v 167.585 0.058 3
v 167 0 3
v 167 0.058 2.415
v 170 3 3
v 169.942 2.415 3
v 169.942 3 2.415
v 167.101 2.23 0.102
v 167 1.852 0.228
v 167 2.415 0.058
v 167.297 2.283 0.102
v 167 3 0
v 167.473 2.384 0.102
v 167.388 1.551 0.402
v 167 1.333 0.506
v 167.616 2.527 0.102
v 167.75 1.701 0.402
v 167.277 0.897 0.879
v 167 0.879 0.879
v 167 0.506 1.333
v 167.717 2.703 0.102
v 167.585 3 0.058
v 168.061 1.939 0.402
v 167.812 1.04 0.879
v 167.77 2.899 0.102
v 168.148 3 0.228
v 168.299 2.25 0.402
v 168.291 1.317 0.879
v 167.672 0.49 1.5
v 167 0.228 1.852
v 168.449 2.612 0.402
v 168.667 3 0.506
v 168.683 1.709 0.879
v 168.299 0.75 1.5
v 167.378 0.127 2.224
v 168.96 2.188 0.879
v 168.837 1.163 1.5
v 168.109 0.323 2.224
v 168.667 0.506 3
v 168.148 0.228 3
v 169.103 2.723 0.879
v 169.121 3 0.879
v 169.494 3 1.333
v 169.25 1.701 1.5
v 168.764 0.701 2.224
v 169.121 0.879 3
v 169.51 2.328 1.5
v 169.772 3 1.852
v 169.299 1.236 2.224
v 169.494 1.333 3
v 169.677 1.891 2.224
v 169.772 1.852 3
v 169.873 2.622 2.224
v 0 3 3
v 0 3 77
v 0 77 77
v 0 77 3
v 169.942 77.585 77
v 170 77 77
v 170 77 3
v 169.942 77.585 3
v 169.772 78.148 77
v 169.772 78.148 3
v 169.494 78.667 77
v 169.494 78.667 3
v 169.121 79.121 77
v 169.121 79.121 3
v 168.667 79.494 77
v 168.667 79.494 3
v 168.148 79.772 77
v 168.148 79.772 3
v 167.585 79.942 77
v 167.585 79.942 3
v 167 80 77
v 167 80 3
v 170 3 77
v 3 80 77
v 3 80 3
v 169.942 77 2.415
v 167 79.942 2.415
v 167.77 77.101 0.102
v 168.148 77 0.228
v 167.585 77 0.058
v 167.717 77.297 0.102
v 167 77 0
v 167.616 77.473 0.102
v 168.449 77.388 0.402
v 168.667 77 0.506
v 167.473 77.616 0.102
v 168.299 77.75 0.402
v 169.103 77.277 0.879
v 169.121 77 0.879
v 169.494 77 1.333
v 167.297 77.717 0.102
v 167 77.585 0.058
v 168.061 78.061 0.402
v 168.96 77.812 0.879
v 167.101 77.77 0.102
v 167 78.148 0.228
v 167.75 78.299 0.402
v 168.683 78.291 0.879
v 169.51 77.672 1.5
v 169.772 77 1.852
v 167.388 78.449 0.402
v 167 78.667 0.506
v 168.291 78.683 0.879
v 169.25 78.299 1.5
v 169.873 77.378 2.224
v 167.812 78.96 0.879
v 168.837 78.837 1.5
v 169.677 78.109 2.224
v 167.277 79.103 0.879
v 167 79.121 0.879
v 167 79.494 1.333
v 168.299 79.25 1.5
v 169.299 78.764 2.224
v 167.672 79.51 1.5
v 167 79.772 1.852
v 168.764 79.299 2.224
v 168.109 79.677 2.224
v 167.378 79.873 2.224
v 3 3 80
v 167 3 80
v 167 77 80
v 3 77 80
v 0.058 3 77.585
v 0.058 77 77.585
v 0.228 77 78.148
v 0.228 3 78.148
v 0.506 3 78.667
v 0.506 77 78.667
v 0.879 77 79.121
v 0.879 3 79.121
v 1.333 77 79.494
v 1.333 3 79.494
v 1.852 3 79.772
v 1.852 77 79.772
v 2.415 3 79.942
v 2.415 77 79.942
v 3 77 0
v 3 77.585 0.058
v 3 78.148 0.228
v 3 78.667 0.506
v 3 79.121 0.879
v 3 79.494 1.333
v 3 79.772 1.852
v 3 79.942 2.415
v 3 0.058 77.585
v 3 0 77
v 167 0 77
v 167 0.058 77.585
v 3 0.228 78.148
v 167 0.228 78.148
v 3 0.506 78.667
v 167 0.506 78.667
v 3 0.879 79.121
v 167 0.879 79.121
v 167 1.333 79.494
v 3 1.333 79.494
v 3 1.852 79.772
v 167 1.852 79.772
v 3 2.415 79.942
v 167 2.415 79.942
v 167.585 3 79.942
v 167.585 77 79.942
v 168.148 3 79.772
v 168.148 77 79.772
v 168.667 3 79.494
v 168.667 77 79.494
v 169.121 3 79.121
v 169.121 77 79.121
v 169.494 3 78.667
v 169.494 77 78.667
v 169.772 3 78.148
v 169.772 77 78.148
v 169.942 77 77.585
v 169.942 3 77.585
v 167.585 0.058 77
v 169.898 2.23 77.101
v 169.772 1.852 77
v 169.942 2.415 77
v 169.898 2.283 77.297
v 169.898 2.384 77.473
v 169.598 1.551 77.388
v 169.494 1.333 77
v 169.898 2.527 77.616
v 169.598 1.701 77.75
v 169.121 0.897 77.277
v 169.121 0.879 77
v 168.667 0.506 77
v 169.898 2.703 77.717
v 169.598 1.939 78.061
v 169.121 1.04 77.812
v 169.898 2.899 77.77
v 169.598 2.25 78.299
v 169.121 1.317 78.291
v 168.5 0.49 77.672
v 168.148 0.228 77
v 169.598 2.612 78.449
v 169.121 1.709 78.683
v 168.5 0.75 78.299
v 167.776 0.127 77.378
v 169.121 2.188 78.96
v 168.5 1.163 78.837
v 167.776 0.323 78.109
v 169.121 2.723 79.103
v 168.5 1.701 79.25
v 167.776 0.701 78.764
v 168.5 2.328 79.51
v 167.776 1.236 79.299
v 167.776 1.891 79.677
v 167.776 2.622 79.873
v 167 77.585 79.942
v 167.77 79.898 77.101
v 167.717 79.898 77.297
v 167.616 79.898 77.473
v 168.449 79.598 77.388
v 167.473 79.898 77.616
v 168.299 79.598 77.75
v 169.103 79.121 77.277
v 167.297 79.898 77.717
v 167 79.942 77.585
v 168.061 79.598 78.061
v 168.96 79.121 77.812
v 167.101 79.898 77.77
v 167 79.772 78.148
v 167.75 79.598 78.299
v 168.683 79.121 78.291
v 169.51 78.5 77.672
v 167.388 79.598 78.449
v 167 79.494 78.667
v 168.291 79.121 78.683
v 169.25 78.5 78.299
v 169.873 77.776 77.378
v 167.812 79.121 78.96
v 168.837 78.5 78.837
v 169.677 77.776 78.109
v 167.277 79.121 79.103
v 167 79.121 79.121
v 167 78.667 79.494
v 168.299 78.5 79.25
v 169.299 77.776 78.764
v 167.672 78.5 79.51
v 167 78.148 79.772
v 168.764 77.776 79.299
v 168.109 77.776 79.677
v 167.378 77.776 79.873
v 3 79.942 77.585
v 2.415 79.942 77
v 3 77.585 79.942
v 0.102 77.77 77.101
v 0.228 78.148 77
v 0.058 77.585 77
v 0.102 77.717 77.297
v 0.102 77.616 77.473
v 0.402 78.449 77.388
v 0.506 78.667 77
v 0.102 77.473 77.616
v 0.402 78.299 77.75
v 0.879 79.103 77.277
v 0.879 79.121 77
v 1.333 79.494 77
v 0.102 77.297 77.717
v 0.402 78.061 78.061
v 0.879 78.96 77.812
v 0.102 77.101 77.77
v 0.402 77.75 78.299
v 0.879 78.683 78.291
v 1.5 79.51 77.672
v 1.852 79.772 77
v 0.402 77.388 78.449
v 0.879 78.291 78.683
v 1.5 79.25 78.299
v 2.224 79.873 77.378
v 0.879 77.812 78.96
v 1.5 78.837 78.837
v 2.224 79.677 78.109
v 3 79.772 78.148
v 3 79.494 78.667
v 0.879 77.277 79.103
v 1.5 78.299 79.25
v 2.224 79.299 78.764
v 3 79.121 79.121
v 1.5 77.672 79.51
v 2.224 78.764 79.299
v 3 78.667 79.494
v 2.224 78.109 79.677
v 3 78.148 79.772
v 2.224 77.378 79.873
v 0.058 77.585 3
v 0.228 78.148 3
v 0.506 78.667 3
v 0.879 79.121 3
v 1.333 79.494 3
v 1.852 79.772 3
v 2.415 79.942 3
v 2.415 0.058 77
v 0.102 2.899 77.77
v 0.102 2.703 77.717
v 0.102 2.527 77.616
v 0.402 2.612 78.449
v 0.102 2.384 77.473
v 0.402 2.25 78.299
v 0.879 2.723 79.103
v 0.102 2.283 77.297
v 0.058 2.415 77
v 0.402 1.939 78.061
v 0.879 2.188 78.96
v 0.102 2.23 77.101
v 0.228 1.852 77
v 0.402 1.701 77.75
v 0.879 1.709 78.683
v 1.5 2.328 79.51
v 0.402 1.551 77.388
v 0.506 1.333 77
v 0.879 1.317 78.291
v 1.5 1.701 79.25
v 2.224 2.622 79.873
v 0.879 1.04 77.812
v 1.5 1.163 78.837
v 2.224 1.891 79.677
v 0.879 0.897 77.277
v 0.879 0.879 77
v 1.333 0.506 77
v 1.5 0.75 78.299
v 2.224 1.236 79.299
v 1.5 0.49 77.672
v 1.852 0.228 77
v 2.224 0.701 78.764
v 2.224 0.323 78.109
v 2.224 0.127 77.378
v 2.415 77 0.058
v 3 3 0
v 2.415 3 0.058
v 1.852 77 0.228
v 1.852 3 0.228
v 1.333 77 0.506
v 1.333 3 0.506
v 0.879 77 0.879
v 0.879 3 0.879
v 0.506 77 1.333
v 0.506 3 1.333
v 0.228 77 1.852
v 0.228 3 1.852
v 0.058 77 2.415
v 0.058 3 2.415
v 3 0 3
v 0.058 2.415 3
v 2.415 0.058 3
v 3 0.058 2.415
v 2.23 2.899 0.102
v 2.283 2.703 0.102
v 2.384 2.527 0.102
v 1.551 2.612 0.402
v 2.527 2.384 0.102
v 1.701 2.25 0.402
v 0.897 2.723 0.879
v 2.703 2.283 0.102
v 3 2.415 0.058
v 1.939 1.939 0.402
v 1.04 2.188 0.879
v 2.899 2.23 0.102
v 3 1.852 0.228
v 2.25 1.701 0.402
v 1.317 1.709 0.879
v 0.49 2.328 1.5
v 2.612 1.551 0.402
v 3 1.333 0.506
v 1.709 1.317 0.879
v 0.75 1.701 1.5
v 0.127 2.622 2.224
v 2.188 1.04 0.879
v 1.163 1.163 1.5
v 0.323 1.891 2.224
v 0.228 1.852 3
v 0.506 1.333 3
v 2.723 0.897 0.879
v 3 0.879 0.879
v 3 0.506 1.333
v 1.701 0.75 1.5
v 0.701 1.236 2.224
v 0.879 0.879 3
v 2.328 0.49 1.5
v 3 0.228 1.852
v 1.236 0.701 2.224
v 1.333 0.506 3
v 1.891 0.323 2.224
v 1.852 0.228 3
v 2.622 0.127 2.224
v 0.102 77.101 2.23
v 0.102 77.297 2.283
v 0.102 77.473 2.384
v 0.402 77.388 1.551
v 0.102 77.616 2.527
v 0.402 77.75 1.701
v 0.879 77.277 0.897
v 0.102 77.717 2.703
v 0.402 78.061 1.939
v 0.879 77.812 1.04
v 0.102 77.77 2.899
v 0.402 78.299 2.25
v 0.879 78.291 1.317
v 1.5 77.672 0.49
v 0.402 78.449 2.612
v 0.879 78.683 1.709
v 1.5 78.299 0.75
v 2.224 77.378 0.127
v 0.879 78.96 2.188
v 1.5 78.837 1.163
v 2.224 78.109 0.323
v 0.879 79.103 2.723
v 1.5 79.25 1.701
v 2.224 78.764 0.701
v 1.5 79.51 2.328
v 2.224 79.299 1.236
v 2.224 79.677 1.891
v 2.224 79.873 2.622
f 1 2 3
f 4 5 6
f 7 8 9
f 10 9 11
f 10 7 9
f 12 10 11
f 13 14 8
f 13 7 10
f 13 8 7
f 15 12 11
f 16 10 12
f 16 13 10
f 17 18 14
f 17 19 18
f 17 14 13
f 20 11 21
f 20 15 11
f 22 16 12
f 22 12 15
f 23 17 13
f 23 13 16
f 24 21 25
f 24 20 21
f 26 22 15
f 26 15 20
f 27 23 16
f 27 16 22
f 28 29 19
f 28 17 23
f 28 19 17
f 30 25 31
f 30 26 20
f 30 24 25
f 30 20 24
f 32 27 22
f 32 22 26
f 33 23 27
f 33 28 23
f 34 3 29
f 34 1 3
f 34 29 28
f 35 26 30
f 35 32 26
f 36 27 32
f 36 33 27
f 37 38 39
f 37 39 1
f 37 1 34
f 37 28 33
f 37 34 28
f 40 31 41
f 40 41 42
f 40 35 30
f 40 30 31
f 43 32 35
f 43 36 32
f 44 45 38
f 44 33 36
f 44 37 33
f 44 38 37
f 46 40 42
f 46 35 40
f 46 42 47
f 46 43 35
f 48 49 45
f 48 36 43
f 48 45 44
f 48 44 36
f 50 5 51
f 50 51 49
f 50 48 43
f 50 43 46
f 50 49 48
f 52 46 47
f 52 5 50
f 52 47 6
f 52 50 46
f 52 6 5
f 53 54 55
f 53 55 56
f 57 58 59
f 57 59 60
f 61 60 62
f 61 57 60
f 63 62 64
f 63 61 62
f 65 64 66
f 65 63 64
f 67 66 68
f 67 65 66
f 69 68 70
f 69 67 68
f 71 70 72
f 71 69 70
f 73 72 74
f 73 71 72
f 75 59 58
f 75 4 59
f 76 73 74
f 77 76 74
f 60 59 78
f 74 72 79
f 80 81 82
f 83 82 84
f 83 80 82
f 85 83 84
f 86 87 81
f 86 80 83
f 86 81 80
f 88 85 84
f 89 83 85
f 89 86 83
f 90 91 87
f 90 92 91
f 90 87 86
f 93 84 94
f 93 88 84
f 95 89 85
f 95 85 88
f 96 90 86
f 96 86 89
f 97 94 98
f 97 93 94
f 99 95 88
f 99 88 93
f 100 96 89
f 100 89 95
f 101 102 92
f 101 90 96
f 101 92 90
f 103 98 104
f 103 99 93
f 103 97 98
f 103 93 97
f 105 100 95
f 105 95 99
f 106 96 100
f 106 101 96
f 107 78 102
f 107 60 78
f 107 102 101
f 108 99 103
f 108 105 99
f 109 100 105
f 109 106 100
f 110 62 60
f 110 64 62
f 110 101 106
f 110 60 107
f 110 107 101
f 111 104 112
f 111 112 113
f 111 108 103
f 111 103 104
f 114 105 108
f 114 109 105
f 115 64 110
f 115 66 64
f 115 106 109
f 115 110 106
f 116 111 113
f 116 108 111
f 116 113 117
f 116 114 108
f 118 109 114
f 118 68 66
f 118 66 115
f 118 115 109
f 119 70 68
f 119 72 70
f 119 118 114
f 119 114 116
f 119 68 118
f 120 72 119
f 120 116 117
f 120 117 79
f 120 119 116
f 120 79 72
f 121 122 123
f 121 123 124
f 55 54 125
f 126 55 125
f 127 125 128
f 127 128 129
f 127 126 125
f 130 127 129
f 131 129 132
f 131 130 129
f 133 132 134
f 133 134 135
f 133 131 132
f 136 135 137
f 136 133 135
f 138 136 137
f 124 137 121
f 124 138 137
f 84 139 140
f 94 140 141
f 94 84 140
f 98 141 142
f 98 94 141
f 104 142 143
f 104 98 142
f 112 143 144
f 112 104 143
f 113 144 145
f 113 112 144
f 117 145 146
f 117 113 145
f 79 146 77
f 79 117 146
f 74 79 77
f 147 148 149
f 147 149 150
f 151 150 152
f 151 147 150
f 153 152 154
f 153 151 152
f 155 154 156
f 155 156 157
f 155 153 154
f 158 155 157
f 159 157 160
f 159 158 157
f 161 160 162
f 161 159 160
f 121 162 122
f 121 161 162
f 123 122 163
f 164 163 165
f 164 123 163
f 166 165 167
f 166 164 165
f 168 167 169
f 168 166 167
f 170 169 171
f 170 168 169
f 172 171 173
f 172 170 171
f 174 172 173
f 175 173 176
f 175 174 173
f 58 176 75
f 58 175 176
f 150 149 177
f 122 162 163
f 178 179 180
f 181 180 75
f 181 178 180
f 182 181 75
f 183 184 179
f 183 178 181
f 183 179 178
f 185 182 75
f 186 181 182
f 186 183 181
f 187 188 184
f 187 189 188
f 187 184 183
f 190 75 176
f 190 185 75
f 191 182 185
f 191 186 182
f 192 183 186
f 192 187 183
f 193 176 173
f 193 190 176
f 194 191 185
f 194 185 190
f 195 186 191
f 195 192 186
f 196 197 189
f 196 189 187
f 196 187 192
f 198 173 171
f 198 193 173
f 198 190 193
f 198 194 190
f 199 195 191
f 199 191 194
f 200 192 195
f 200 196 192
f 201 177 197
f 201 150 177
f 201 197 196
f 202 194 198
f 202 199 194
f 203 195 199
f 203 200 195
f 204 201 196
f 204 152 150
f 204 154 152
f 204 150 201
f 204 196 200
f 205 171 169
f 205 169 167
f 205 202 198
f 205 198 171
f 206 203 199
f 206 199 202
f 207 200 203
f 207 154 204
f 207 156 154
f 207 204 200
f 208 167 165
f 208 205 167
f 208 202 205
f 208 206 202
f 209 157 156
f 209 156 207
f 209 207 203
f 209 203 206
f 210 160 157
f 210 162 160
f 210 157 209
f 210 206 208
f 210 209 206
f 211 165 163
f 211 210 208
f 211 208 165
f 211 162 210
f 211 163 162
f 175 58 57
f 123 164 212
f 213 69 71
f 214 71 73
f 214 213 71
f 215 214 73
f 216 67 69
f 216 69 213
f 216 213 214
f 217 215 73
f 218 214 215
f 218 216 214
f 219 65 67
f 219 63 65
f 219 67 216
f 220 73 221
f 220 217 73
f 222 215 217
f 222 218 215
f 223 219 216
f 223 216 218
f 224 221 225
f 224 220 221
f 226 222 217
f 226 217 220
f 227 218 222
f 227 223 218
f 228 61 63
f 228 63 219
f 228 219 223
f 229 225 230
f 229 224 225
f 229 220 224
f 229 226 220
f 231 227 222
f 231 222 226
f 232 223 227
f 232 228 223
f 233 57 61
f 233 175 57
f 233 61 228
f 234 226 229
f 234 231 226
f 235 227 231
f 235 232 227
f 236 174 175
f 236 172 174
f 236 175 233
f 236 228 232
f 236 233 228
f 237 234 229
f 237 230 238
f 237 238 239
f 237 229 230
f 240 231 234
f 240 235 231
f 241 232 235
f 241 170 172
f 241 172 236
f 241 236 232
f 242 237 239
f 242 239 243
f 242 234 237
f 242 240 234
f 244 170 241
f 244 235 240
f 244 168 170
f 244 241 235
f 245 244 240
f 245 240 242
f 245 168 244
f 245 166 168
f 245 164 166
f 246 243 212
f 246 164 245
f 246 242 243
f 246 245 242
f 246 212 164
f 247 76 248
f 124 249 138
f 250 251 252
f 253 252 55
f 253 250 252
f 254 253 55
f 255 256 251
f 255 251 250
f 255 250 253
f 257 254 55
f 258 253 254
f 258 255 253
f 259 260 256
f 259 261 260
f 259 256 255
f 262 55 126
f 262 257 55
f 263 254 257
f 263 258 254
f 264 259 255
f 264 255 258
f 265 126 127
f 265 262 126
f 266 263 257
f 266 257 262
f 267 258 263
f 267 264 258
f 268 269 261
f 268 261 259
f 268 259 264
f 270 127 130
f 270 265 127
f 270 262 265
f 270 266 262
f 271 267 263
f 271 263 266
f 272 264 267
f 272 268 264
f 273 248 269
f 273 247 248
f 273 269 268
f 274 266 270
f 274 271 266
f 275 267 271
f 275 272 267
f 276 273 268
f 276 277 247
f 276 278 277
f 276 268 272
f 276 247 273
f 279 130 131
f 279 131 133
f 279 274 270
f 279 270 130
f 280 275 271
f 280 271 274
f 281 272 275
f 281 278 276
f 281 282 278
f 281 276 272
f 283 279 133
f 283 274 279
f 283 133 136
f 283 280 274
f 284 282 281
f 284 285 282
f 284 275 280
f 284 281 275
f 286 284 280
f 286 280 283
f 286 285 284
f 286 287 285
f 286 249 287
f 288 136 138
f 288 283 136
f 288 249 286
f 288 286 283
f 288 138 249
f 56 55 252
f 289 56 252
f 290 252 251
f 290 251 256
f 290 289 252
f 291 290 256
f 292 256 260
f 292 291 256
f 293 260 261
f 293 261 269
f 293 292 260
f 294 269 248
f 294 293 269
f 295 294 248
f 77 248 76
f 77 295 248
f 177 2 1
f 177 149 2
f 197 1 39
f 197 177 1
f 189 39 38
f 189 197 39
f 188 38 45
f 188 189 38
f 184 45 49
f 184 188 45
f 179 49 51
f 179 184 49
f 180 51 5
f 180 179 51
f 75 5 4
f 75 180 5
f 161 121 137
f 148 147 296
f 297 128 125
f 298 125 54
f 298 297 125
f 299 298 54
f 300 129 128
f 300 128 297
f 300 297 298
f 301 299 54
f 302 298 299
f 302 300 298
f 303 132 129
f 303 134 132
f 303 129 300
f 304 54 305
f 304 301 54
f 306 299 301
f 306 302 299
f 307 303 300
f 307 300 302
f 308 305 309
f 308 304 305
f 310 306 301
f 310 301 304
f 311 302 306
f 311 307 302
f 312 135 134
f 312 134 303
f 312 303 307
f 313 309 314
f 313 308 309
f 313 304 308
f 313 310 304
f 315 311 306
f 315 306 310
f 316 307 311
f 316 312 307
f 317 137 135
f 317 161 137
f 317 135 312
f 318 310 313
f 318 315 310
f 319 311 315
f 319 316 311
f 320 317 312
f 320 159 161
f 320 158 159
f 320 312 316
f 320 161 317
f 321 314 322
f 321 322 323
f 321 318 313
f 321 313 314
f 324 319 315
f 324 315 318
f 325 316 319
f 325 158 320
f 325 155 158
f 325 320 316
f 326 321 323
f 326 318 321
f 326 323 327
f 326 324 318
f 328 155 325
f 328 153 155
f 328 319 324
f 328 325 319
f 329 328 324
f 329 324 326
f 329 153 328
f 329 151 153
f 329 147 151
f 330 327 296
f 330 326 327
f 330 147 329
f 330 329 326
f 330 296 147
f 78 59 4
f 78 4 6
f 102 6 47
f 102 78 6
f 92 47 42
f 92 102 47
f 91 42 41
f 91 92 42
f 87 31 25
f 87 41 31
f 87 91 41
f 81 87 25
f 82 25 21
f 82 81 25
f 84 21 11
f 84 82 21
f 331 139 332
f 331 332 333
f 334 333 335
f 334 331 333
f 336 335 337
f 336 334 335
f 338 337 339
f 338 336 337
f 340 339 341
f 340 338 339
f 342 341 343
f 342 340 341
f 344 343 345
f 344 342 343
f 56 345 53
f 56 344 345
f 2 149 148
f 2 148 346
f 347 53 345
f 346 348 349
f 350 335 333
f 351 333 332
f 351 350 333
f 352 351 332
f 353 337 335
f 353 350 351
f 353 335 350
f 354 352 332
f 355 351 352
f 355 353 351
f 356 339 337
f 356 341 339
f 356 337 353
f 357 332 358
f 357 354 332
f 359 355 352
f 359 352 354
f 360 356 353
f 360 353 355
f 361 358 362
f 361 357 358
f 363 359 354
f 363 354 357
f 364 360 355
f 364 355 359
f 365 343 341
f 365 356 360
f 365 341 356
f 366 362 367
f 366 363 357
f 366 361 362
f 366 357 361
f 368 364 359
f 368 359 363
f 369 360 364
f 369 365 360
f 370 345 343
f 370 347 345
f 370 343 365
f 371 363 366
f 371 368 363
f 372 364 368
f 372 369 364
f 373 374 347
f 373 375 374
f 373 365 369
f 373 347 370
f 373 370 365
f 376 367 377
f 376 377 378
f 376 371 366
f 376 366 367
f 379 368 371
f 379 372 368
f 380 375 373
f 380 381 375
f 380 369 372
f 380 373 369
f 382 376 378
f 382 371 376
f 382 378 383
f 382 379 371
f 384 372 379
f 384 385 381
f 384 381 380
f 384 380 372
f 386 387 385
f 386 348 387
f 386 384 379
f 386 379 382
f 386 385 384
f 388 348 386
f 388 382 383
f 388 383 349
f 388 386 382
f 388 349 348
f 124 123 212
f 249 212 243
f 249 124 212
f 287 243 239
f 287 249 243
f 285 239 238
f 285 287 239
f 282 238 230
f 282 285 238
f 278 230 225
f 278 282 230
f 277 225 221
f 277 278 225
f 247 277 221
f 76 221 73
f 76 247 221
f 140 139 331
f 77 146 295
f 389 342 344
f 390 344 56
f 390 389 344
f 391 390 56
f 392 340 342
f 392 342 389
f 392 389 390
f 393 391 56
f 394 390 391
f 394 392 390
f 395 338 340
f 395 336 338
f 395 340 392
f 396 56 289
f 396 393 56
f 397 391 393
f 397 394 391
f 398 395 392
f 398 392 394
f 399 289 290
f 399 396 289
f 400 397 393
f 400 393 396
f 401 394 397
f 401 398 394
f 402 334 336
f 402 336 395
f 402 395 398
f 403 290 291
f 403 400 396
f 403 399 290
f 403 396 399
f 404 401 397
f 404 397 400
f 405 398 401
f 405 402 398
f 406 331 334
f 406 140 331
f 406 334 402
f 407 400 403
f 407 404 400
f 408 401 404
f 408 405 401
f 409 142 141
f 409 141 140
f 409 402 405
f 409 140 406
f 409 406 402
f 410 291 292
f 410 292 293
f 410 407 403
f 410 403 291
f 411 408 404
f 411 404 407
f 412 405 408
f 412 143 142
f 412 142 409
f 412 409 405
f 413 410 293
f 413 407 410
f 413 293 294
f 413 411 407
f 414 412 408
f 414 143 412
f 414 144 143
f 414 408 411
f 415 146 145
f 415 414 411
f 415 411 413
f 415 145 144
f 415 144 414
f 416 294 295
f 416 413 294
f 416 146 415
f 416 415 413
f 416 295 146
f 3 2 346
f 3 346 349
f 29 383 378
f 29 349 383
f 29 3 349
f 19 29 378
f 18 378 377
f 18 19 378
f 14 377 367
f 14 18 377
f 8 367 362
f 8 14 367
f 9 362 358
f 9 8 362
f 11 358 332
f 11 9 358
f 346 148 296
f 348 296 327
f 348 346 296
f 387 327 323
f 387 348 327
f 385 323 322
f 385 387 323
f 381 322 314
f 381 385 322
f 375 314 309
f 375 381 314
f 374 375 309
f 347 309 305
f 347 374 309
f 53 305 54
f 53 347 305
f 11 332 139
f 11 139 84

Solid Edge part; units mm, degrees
sketch "Sketch1" plane through (0, 0, 0) normal (0, -1, 0) x (1, 0, 0)
  line L0 (0, 0) -> (170, 0)
  line L1 (170, 0) -> (170, 80)
  line L2 (170, 80) -> (0, 80)
  line L3 (0, 80) -> (0, 0)
extrude "Protrusion1" add sketch "Sketch1" against normal blind 80
fillet "Redondo_1" radius 3 12 edges at (85, 0, 80) (170, 0, 40) (170, 40, 80) (170, 80, 40) (170, 40, 0) (85, 80, 80) (85, 80, 0) (0, 80, 40) (0, 40, 80) (0, 0, 40) (0, 40, 0) (85, 0, 0)
properties material "PVC"
